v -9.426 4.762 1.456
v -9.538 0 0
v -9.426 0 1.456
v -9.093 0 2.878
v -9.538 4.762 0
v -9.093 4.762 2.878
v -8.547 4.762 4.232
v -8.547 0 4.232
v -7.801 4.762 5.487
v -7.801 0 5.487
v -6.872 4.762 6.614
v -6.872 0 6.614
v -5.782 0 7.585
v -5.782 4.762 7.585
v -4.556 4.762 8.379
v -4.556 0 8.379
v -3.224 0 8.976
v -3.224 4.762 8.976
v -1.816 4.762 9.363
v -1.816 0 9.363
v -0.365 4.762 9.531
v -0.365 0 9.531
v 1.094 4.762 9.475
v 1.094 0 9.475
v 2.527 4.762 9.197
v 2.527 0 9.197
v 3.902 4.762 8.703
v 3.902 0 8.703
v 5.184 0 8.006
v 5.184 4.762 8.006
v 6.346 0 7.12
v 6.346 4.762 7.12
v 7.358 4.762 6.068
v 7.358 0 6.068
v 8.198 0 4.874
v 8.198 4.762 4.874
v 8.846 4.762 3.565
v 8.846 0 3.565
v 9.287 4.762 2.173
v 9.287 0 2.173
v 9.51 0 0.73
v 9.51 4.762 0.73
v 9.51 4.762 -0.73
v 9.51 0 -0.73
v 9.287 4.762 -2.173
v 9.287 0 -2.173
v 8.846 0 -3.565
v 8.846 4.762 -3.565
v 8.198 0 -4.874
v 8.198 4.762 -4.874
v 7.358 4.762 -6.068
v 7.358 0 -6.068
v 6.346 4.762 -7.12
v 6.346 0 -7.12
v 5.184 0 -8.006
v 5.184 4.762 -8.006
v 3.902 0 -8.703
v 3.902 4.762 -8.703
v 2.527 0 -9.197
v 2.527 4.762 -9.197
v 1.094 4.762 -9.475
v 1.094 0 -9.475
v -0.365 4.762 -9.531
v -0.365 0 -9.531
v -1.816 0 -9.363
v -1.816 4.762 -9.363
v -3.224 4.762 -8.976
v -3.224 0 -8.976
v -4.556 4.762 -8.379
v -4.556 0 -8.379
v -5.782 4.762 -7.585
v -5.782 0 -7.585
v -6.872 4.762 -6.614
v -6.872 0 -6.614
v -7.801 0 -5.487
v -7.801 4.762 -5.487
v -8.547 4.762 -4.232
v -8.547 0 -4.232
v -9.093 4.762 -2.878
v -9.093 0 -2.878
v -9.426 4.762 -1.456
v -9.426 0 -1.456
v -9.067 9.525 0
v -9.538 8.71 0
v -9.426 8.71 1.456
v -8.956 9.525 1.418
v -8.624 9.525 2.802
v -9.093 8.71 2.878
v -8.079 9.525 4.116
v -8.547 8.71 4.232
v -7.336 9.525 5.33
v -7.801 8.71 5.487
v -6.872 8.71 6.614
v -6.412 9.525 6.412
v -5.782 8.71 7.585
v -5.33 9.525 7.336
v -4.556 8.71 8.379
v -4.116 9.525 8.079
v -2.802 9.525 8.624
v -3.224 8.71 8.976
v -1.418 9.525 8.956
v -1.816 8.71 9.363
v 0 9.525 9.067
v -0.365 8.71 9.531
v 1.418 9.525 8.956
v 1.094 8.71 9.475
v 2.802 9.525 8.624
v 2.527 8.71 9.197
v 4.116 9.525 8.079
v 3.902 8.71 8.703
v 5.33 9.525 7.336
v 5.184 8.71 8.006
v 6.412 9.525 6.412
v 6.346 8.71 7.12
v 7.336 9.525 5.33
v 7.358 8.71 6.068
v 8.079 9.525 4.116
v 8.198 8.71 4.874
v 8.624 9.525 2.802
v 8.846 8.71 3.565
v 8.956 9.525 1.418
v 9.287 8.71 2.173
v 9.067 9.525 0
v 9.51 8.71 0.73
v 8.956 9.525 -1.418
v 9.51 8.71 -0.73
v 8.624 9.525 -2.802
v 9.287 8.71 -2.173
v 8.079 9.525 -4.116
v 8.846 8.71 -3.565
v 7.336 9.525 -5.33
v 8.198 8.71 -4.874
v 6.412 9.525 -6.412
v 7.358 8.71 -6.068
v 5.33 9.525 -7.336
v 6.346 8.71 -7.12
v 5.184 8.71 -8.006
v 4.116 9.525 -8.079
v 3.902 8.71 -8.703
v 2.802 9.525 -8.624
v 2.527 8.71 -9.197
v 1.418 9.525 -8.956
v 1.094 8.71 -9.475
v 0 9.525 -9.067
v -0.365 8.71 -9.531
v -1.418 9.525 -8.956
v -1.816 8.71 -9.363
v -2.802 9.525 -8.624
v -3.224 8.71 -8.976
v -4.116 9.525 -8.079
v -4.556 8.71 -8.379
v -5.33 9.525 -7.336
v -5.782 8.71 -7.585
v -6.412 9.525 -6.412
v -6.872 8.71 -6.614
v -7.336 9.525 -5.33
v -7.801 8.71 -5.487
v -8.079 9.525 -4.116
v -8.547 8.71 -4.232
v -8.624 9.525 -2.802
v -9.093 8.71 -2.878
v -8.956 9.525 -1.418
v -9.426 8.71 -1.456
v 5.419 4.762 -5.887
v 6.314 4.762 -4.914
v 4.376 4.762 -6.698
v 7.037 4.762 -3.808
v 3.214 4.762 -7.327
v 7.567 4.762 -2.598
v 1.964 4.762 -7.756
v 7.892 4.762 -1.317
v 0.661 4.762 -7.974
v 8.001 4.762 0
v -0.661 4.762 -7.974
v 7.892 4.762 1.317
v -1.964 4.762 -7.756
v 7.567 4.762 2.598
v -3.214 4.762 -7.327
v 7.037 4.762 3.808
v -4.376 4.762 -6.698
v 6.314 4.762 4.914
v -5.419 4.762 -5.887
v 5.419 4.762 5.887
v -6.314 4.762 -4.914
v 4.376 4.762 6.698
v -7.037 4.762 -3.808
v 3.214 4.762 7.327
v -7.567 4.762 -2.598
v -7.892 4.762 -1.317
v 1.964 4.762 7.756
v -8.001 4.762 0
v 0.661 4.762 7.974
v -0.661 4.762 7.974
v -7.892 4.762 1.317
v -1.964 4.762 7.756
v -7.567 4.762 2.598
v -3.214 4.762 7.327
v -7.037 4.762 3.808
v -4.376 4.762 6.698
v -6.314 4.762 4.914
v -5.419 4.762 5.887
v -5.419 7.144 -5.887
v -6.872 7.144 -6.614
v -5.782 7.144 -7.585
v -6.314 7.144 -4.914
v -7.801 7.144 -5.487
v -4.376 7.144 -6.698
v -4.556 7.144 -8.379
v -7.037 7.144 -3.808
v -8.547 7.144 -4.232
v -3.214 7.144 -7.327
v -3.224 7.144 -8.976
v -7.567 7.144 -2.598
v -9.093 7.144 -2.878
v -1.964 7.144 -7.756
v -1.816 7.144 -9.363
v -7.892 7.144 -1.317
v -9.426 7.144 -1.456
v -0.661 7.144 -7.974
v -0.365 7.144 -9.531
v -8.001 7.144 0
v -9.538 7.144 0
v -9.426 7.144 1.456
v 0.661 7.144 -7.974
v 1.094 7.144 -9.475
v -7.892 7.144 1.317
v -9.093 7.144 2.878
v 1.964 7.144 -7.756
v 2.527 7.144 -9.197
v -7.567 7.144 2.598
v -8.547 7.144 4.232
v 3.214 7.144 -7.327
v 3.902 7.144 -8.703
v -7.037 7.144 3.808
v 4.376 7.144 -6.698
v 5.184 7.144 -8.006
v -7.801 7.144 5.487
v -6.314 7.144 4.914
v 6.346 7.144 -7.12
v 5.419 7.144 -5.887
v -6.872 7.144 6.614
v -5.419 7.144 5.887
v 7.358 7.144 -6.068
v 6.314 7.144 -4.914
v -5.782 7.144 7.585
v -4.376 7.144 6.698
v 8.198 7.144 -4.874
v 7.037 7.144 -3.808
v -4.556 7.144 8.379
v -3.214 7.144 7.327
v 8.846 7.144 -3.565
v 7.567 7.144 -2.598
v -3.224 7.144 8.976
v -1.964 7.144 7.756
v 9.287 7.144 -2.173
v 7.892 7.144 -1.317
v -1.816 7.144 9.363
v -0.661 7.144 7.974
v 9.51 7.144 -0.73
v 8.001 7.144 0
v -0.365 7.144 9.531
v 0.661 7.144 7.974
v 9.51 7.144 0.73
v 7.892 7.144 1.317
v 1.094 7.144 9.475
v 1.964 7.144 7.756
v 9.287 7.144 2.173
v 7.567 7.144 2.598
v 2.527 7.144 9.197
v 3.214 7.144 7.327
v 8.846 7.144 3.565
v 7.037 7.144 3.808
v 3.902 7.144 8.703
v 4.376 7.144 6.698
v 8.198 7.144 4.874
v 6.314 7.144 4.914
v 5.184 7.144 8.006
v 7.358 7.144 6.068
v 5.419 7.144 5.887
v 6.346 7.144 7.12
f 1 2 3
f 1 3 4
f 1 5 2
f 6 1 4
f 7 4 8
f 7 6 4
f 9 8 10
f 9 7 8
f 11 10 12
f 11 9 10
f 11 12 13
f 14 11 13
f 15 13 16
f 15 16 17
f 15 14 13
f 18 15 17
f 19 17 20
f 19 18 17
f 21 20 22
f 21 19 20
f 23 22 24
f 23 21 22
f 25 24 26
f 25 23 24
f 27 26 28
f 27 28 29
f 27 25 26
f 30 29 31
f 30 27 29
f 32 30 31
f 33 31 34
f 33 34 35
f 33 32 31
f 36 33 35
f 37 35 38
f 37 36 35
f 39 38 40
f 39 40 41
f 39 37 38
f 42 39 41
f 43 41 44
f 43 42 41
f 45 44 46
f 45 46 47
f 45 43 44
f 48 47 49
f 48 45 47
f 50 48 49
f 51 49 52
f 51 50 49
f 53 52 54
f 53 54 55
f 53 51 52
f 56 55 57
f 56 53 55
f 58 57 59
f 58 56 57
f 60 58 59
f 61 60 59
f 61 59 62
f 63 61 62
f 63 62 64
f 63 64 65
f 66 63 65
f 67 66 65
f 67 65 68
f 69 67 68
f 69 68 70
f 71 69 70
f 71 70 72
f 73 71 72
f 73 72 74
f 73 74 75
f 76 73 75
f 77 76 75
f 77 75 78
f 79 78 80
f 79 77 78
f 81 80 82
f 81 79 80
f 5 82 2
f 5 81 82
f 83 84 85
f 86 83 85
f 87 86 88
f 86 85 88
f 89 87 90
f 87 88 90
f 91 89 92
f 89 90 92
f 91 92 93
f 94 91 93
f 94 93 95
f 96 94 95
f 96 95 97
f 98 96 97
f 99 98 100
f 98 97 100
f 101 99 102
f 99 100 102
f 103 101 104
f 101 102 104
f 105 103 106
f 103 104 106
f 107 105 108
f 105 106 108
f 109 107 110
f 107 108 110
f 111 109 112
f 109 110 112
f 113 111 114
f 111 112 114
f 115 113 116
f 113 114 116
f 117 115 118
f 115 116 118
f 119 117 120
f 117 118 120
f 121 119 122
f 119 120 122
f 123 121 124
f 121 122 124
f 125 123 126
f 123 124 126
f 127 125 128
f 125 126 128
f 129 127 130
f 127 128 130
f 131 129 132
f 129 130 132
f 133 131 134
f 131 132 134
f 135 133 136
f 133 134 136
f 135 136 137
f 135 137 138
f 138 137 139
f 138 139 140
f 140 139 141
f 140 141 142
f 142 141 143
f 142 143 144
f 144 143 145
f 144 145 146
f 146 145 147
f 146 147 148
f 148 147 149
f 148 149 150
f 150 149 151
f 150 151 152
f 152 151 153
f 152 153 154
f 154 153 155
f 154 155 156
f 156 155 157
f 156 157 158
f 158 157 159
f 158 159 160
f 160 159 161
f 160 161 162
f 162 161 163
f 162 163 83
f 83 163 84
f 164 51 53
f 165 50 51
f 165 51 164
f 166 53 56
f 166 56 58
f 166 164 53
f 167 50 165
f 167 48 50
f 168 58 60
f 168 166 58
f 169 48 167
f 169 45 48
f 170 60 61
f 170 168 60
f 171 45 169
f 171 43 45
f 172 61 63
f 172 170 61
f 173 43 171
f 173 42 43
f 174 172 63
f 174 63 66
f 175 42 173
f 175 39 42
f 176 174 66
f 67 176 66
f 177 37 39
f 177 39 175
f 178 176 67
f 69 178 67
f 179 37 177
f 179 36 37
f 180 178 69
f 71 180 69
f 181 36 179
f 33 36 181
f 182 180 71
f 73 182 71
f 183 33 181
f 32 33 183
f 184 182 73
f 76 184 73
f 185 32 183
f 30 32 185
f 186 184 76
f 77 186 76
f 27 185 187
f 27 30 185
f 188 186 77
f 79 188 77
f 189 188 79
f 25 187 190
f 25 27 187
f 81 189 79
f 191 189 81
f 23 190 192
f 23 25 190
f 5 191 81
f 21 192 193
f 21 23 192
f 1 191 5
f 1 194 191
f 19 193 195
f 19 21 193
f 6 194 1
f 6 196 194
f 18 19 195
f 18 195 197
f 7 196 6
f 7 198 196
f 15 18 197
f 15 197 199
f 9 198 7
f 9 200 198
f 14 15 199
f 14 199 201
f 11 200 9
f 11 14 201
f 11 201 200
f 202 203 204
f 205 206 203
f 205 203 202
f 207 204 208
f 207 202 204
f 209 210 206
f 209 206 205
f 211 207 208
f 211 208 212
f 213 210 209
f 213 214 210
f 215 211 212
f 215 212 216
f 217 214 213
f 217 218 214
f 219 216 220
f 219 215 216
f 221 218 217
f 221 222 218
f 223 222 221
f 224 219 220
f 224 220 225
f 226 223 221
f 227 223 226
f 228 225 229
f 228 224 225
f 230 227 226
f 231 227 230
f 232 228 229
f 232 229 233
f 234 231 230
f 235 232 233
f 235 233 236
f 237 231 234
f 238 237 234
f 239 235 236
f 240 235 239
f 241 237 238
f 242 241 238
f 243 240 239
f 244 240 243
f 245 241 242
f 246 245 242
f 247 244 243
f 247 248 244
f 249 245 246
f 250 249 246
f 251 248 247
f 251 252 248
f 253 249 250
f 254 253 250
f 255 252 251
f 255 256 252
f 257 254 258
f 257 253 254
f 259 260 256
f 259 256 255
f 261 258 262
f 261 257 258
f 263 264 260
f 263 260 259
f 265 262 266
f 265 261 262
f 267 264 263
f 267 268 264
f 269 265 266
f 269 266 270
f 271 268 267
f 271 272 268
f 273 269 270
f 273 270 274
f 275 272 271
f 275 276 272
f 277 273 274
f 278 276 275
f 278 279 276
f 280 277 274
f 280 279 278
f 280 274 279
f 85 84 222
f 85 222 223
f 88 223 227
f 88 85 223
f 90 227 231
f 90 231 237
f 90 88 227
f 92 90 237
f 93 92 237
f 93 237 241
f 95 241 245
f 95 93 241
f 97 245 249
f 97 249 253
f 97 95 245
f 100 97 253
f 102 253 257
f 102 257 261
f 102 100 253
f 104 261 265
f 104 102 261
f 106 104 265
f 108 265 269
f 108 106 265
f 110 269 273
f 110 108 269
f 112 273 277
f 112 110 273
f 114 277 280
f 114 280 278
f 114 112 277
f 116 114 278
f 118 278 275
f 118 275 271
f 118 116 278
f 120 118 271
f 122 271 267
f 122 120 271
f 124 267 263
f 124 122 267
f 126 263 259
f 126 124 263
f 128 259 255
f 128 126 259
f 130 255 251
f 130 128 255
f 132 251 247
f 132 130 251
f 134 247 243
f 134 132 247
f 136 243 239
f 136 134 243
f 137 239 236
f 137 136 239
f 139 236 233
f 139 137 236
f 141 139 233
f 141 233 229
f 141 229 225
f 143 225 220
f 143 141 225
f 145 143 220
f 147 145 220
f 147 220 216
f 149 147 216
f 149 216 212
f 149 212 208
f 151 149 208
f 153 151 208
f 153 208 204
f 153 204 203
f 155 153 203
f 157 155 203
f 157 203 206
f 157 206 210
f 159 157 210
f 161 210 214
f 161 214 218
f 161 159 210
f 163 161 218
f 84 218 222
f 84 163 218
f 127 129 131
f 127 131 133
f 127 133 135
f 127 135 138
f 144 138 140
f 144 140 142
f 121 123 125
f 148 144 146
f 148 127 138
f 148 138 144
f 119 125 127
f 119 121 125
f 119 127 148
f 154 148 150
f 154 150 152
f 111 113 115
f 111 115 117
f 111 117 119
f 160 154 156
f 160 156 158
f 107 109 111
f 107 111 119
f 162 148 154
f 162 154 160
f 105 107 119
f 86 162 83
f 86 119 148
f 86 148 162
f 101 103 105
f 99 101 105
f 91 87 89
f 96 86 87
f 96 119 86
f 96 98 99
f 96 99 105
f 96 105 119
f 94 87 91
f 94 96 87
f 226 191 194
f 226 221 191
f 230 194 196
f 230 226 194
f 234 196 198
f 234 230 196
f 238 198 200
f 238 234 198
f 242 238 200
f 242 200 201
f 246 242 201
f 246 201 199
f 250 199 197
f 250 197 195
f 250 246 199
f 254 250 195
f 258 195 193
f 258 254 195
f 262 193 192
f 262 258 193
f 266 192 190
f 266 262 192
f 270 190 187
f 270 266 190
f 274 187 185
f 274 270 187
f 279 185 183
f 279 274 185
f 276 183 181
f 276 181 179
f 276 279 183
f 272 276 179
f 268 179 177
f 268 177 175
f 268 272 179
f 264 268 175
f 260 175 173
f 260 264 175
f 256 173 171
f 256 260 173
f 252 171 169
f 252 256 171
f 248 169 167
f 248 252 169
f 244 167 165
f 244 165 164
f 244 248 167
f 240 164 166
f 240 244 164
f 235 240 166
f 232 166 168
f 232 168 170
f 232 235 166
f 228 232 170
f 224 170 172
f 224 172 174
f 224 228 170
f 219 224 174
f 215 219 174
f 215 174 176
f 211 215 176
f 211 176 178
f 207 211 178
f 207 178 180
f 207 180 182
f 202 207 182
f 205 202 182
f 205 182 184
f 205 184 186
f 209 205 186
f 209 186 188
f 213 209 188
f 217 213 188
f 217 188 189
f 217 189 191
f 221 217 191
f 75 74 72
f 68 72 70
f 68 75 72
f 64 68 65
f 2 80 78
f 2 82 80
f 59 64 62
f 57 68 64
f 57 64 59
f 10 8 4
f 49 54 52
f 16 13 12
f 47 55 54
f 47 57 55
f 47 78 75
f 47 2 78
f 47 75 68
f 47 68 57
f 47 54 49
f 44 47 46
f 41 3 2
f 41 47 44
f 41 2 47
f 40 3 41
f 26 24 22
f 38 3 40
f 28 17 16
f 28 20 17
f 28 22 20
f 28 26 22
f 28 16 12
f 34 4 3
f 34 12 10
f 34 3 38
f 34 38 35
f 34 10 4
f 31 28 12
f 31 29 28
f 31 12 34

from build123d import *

# Parameters (mm, degrees)
CHAMFER1_SIZE  = 0.47037037
CHAMFER1_SIZE2 = 0.81470538


with BuildPart() as part:
    # Sketch1 → Revolve1 (revolve)
    with BuildSketch(Plane.XY):
        Polygon((0, 0), (-9.5377, 0), (-9.5377, 4.7625), (-8.001, 4.7625), (-8.001, 7.14375), (-9.5377, 7.14375), (-9.5377, 9.525), (0, 9.525), align=None)
    revolve(axis=Axis((0, 0, 0), (0, 1, 0)))

    # Chamfer1
    chamfer1_edges = [part.edges().sort_by_distance(p)[0] for p in [
        (9.5377, 9.525, 0),
    ]]
    chamfer1_side = [part.faces().sort_by_distance(p)[0] for p in [
        (0, 9.525, 0),
    ]]
    chamfer(chamfer1_edges, length=CHAMFER1_SIZE, length2=CHAMFER1_SIZE2, reference=chamfer1_side[0])


solid = part.part
